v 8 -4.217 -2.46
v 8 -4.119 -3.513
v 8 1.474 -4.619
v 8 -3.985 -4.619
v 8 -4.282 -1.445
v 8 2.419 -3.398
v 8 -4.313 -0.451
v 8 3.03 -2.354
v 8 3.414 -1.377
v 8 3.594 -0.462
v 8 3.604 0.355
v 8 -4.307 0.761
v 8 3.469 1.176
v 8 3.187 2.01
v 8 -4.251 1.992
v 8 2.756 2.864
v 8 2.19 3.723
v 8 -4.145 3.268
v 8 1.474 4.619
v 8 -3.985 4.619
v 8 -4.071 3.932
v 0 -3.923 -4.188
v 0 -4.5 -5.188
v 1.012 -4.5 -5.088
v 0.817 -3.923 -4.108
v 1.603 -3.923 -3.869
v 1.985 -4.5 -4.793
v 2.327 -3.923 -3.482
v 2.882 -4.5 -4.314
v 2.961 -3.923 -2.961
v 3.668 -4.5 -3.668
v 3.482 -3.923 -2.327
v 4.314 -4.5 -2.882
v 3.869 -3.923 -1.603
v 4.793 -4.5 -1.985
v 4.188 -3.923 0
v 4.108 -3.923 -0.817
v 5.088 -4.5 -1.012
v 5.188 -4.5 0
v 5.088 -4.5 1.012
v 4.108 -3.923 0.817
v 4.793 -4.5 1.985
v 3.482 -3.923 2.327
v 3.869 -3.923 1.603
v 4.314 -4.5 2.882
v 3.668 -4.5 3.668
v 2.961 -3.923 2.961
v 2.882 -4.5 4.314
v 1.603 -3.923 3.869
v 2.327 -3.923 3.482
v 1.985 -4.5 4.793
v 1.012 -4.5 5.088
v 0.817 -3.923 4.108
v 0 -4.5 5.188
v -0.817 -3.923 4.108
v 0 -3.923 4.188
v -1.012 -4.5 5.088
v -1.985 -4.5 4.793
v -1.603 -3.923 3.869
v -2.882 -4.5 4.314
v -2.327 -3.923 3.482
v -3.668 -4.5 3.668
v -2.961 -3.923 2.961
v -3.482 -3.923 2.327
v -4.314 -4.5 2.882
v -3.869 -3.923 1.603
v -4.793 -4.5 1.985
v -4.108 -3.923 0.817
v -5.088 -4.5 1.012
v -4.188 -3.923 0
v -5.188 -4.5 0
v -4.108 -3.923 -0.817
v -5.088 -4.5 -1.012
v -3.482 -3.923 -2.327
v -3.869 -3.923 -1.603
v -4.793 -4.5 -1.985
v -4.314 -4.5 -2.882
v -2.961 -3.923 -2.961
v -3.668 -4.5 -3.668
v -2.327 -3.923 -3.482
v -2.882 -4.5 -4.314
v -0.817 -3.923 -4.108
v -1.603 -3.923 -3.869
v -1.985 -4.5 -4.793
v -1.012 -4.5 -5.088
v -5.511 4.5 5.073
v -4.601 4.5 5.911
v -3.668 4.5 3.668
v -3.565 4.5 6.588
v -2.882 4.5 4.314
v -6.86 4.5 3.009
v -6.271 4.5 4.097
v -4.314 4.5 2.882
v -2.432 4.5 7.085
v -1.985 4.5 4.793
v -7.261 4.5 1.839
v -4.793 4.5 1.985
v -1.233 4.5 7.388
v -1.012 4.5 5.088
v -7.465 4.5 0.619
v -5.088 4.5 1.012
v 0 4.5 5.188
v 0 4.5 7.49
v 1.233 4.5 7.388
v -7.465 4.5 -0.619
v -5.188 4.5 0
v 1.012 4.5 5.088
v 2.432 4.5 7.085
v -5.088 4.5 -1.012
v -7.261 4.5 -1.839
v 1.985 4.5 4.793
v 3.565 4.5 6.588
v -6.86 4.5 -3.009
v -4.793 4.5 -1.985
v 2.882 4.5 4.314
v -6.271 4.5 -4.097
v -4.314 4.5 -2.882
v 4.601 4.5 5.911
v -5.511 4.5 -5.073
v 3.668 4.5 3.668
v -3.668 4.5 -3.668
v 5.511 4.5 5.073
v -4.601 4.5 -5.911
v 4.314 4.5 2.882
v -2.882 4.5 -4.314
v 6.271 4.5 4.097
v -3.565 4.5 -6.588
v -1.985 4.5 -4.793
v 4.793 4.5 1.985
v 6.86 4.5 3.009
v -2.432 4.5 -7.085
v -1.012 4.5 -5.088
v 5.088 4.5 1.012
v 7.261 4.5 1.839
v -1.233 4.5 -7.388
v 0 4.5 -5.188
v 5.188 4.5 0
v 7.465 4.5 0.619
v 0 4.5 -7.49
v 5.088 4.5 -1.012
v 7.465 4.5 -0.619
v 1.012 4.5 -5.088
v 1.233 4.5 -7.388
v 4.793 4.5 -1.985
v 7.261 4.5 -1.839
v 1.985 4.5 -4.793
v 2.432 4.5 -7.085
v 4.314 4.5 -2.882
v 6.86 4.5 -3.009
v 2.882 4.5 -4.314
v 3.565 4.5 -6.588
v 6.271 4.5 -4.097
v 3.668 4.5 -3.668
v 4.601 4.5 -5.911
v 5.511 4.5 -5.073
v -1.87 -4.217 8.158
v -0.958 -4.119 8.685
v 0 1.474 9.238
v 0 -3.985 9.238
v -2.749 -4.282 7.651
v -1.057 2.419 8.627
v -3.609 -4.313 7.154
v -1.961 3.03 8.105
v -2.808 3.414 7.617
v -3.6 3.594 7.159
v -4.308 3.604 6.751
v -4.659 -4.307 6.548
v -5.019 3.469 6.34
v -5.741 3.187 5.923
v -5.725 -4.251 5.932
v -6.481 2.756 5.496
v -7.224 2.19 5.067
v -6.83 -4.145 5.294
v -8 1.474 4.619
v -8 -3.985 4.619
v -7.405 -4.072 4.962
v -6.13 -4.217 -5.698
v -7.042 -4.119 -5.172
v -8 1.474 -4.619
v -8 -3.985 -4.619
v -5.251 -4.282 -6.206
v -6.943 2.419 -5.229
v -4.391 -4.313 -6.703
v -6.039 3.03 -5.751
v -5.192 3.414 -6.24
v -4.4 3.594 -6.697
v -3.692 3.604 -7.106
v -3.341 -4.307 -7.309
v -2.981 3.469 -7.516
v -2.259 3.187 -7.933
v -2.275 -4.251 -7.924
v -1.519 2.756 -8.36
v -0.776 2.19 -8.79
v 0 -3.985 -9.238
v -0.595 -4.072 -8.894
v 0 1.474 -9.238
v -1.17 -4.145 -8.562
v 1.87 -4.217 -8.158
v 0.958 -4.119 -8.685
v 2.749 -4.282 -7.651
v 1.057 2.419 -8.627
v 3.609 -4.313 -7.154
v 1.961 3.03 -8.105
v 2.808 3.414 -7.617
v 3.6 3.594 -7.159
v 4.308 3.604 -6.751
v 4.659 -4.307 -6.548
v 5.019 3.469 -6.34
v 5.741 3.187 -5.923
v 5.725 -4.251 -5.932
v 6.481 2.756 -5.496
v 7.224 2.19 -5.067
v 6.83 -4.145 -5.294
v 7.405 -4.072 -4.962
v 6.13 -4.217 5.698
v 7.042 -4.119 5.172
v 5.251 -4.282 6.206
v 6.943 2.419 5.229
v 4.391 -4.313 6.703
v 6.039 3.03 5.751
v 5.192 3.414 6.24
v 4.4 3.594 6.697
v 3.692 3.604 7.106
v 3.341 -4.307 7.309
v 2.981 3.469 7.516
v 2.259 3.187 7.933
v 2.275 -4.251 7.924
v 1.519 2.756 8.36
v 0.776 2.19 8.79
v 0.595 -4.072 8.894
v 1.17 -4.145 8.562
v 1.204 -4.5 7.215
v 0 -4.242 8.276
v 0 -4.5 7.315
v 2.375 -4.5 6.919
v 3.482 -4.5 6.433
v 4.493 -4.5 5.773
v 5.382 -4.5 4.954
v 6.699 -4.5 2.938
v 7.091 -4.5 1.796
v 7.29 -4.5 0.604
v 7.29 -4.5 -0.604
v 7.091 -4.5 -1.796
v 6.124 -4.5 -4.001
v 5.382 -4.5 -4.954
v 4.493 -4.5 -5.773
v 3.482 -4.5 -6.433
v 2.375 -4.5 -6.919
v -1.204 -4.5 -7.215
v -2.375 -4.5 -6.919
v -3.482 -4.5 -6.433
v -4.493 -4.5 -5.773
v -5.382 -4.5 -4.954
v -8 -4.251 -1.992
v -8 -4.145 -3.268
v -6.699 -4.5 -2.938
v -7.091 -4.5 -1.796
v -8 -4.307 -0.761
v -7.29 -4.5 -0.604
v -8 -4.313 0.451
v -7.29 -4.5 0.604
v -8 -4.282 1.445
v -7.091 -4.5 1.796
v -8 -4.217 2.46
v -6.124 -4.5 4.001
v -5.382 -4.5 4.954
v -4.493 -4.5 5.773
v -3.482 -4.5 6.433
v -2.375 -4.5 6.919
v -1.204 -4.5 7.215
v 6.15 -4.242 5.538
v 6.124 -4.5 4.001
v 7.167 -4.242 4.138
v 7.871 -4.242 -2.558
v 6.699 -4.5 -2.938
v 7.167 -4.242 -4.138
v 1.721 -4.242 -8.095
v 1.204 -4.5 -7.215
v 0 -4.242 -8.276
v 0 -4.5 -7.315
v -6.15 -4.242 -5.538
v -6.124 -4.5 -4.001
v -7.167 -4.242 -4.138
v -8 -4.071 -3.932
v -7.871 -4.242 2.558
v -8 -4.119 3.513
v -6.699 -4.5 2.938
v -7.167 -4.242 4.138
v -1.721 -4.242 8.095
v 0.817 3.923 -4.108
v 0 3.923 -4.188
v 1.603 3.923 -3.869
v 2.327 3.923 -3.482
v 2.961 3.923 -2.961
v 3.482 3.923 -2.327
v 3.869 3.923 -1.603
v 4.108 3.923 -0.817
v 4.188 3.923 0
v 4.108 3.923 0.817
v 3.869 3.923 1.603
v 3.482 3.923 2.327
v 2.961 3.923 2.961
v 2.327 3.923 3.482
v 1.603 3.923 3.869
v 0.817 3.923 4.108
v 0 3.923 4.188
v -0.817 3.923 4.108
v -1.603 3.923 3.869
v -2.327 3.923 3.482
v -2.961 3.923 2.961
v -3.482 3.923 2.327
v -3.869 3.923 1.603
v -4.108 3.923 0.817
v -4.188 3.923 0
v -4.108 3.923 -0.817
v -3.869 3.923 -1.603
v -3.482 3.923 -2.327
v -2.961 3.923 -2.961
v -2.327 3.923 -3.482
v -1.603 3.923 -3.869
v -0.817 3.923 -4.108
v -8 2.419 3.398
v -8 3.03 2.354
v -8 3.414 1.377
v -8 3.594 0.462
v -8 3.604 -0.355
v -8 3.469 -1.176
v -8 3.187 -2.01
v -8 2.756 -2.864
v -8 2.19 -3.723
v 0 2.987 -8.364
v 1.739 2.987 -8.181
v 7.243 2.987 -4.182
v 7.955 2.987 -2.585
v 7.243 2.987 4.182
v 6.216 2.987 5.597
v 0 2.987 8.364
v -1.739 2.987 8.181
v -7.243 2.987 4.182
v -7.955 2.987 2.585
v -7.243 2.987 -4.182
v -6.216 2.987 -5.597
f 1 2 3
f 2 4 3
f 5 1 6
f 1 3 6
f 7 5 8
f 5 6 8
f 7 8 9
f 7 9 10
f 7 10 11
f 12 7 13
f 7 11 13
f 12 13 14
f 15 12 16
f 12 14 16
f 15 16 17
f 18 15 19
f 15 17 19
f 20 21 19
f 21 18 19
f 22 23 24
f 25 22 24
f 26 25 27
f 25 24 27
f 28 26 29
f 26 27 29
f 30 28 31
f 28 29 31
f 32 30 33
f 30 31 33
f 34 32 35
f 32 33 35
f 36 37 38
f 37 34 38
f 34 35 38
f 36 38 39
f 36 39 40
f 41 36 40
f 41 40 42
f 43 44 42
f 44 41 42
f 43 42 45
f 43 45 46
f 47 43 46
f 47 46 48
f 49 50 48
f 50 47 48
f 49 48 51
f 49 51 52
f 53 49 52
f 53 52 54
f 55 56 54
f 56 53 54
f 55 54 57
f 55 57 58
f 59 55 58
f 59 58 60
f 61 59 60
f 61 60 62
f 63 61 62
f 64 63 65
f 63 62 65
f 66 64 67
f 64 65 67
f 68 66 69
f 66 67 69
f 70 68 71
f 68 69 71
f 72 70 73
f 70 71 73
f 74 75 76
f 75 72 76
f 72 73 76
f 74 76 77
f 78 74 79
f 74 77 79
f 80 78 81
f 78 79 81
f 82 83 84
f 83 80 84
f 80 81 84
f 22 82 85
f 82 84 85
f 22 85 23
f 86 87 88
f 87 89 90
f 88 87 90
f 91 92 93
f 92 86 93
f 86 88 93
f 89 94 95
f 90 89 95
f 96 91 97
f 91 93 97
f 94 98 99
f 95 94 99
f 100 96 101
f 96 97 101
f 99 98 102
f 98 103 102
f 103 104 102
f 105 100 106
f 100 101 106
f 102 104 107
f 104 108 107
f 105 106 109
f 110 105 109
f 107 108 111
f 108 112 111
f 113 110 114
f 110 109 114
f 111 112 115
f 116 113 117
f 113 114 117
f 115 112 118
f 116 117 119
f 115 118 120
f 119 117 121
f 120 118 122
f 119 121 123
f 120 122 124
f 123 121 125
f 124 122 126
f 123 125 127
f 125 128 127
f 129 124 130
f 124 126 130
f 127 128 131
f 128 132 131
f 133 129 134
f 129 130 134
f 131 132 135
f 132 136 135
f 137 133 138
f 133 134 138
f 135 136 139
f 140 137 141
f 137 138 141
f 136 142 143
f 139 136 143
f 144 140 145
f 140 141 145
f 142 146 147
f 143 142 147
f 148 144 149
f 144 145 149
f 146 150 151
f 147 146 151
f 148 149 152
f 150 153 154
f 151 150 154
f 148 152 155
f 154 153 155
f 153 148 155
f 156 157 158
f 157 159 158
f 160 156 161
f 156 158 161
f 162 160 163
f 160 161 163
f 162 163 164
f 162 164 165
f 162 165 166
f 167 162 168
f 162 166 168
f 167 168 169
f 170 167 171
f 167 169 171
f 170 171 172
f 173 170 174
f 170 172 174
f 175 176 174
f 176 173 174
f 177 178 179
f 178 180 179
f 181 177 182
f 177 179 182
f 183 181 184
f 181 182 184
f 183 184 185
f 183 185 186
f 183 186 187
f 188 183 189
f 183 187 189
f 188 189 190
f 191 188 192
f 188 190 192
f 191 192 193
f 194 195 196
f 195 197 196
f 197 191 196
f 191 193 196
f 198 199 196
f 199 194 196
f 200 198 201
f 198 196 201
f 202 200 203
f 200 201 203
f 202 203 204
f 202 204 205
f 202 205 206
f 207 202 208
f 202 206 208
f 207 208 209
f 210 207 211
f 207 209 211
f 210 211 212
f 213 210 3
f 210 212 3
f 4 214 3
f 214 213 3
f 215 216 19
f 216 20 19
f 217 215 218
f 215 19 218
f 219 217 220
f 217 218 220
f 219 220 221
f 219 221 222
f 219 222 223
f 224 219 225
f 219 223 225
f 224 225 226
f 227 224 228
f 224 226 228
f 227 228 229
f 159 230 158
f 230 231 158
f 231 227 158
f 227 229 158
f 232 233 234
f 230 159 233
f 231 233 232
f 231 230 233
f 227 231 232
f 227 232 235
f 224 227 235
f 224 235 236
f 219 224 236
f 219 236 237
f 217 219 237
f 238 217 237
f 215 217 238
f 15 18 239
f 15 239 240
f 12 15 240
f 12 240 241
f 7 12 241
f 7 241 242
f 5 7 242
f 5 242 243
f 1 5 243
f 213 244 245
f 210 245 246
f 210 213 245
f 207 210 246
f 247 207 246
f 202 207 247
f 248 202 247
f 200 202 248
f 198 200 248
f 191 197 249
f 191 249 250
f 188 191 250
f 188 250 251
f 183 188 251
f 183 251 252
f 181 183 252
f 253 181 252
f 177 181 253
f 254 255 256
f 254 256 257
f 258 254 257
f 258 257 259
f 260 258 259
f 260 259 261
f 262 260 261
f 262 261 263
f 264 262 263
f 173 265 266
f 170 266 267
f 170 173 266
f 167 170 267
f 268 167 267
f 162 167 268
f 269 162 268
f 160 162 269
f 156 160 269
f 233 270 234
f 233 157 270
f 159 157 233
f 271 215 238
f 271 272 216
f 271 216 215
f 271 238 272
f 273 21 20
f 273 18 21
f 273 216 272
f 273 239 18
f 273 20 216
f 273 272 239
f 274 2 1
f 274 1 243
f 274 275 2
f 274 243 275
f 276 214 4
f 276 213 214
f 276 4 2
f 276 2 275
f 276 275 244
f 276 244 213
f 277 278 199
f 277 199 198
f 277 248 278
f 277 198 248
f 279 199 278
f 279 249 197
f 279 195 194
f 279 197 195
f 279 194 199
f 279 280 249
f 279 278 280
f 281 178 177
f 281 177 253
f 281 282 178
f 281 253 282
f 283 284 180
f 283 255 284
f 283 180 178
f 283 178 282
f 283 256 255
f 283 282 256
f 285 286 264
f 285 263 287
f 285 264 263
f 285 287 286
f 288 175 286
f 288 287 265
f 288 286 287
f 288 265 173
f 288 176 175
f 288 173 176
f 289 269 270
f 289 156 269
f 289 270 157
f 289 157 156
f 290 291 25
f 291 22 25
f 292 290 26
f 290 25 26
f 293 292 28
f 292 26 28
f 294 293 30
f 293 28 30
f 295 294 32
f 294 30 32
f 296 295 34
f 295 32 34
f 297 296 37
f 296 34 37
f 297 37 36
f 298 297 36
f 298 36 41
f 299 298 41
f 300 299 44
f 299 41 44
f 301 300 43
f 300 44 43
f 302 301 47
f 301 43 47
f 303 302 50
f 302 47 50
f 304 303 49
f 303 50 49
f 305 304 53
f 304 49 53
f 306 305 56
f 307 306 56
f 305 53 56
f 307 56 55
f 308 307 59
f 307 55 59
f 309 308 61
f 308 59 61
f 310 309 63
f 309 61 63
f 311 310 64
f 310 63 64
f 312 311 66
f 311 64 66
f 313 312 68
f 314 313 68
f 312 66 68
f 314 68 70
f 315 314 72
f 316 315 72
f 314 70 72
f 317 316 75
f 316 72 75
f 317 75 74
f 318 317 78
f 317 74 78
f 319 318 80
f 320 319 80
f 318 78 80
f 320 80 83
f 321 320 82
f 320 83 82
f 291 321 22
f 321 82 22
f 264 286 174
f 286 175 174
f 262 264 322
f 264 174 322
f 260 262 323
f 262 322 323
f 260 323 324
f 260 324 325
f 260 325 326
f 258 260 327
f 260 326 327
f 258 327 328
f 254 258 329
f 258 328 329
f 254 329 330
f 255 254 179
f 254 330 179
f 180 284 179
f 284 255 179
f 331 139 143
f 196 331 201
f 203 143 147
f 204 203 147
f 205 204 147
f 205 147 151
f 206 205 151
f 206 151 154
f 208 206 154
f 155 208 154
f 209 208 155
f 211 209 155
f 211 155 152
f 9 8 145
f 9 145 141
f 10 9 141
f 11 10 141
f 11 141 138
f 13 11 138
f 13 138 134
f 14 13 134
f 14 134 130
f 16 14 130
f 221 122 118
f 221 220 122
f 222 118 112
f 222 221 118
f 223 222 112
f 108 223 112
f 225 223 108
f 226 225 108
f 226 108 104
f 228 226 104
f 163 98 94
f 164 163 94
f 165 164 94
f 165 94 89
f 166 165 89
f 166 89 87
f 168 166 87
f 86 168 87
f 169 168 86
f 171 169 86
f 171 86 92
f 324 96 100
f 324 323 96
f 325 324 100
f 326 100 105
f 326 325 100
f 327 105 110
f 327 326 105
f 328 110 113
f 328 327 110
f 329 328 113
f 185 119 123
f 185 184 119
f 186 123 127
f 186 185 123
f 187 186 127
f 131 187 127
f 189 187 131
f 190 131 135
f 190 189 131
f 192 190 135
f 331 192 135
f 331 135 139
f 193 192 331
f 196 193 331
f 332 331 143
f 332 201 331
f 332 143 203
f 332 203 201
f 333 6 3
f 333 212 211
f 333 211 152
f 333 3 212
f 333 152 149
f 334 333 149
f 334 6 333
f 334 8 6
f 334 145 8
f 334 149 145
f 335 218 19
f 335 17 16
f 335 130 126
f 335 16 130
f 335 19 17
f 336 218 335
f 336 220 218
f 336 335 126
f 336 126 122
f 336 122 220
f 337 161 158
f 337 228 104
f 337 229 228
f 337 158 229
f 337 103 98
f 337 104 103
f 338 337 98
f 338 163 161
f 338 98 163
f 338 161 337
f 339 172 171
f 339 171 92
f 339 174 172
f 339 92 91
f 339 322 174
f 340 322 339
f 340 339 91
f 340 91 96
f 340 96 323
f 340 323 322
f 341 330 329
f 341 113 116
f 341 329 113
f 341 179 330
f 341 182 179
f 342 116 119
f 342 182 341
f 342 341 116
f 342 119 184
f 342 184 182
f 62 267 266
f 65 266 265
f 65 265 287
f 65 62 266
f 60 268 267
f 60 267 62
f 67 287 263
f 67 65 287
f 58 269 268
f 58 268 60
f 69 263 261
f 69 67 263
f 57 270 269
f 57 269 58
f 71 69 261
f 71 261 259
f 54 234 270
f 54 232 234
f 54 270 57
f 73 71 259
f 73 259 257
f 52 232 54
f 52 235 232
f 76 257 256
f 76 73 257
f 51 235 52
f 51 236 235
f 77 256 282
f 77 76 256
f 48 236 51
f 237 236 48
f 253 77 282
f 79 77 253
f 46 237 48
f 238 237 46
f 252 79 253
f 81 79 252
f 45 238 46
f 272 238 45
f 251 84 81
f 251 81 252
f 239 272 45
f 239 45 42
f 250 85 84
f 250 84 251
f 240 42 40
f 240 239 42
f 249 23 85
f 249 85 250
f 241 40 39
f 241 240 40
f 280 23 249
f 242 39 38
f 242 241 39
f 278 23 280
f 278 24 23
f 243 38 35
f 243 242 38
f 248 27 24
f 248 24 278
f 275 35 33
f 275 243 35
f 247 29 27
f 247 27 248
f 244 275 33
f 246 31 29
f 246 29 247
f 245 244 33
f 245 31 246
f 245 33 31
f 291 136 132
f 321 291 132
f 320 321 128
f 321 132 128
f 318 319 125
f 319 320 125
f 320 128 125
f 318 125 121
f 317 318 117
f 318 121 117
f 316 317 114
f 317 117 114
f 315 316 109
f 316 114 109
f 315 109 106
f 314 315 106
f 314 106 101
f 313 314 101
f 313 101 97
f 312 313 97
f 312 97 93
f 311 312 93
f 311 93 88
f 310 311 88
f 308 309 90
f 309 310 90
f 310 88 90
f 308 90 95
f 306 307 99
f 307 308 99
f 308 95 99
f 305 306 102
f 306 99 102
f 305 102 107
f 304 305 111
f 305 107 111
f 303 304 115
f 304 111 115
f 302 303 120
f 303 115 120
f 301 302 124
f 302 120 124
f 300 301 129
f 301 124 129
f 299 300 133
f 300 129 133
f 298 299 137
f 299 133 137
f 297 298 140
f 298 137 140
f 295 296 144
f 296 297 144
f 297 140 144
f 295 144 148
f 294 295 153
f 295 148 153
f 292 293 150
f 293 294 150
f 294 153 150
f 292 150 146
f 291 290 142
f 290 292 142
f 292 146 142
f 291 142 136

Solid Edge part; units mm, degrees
sketch "Sketch1" plane through (0, 0, 0) normal (0, -1, 0) x (1, 0, 0)
  line L0 (8, 4.6188) -> (0, 9.2376)
  line L1 (0, 9.2376) -> (-8, 4.6188)
  line L2 (-8, 4.6188) -> (-8, -4.6188)
  line L3 (-8, -4.6188) -> (0, -9.2376)
  line L4 (0, -9.2376) -> (8, -4.6188)
  line L5 (8, -4.6188) -> (8, 4.6188)
extrude "Protrusion1" add sketch "Sketch1" along normal mid plane 9
sketch "Sketch2" plane through (0, 0, 0) normal (1, 0, 0) x (0, 1, 0)
  line L0 (-4.5, 7.315) -> (-3.9848, 9.2376)
revolve "RevolvedCutout1" cut sketch "Sketch2" angle 360 about axis through (0, 0, 0) along (0, -1, 0) material side at (0, -4.2907, 8.2892)
hole "孔_7" at (0, -4.5, 0) direction (0, 1, 0) diameter 8.376 end up to next start chamfer 1 start chamfer angle 60 end chamfer 1 end chamfer angle 60
sketch "Sketch3" plane through (0, 0, 0) normal (1, 0, 0) x (0, 1, 0)
  line L0 (4.5, -7.4905) -> (1.4739, -9.2376)
revolve "RevolvedCutout2" cut sketch "Sketch3" angle 360 about axis through (0, 0, 0) along (0, 1, 0) material side at (0, 3.0119, -8.4074)
